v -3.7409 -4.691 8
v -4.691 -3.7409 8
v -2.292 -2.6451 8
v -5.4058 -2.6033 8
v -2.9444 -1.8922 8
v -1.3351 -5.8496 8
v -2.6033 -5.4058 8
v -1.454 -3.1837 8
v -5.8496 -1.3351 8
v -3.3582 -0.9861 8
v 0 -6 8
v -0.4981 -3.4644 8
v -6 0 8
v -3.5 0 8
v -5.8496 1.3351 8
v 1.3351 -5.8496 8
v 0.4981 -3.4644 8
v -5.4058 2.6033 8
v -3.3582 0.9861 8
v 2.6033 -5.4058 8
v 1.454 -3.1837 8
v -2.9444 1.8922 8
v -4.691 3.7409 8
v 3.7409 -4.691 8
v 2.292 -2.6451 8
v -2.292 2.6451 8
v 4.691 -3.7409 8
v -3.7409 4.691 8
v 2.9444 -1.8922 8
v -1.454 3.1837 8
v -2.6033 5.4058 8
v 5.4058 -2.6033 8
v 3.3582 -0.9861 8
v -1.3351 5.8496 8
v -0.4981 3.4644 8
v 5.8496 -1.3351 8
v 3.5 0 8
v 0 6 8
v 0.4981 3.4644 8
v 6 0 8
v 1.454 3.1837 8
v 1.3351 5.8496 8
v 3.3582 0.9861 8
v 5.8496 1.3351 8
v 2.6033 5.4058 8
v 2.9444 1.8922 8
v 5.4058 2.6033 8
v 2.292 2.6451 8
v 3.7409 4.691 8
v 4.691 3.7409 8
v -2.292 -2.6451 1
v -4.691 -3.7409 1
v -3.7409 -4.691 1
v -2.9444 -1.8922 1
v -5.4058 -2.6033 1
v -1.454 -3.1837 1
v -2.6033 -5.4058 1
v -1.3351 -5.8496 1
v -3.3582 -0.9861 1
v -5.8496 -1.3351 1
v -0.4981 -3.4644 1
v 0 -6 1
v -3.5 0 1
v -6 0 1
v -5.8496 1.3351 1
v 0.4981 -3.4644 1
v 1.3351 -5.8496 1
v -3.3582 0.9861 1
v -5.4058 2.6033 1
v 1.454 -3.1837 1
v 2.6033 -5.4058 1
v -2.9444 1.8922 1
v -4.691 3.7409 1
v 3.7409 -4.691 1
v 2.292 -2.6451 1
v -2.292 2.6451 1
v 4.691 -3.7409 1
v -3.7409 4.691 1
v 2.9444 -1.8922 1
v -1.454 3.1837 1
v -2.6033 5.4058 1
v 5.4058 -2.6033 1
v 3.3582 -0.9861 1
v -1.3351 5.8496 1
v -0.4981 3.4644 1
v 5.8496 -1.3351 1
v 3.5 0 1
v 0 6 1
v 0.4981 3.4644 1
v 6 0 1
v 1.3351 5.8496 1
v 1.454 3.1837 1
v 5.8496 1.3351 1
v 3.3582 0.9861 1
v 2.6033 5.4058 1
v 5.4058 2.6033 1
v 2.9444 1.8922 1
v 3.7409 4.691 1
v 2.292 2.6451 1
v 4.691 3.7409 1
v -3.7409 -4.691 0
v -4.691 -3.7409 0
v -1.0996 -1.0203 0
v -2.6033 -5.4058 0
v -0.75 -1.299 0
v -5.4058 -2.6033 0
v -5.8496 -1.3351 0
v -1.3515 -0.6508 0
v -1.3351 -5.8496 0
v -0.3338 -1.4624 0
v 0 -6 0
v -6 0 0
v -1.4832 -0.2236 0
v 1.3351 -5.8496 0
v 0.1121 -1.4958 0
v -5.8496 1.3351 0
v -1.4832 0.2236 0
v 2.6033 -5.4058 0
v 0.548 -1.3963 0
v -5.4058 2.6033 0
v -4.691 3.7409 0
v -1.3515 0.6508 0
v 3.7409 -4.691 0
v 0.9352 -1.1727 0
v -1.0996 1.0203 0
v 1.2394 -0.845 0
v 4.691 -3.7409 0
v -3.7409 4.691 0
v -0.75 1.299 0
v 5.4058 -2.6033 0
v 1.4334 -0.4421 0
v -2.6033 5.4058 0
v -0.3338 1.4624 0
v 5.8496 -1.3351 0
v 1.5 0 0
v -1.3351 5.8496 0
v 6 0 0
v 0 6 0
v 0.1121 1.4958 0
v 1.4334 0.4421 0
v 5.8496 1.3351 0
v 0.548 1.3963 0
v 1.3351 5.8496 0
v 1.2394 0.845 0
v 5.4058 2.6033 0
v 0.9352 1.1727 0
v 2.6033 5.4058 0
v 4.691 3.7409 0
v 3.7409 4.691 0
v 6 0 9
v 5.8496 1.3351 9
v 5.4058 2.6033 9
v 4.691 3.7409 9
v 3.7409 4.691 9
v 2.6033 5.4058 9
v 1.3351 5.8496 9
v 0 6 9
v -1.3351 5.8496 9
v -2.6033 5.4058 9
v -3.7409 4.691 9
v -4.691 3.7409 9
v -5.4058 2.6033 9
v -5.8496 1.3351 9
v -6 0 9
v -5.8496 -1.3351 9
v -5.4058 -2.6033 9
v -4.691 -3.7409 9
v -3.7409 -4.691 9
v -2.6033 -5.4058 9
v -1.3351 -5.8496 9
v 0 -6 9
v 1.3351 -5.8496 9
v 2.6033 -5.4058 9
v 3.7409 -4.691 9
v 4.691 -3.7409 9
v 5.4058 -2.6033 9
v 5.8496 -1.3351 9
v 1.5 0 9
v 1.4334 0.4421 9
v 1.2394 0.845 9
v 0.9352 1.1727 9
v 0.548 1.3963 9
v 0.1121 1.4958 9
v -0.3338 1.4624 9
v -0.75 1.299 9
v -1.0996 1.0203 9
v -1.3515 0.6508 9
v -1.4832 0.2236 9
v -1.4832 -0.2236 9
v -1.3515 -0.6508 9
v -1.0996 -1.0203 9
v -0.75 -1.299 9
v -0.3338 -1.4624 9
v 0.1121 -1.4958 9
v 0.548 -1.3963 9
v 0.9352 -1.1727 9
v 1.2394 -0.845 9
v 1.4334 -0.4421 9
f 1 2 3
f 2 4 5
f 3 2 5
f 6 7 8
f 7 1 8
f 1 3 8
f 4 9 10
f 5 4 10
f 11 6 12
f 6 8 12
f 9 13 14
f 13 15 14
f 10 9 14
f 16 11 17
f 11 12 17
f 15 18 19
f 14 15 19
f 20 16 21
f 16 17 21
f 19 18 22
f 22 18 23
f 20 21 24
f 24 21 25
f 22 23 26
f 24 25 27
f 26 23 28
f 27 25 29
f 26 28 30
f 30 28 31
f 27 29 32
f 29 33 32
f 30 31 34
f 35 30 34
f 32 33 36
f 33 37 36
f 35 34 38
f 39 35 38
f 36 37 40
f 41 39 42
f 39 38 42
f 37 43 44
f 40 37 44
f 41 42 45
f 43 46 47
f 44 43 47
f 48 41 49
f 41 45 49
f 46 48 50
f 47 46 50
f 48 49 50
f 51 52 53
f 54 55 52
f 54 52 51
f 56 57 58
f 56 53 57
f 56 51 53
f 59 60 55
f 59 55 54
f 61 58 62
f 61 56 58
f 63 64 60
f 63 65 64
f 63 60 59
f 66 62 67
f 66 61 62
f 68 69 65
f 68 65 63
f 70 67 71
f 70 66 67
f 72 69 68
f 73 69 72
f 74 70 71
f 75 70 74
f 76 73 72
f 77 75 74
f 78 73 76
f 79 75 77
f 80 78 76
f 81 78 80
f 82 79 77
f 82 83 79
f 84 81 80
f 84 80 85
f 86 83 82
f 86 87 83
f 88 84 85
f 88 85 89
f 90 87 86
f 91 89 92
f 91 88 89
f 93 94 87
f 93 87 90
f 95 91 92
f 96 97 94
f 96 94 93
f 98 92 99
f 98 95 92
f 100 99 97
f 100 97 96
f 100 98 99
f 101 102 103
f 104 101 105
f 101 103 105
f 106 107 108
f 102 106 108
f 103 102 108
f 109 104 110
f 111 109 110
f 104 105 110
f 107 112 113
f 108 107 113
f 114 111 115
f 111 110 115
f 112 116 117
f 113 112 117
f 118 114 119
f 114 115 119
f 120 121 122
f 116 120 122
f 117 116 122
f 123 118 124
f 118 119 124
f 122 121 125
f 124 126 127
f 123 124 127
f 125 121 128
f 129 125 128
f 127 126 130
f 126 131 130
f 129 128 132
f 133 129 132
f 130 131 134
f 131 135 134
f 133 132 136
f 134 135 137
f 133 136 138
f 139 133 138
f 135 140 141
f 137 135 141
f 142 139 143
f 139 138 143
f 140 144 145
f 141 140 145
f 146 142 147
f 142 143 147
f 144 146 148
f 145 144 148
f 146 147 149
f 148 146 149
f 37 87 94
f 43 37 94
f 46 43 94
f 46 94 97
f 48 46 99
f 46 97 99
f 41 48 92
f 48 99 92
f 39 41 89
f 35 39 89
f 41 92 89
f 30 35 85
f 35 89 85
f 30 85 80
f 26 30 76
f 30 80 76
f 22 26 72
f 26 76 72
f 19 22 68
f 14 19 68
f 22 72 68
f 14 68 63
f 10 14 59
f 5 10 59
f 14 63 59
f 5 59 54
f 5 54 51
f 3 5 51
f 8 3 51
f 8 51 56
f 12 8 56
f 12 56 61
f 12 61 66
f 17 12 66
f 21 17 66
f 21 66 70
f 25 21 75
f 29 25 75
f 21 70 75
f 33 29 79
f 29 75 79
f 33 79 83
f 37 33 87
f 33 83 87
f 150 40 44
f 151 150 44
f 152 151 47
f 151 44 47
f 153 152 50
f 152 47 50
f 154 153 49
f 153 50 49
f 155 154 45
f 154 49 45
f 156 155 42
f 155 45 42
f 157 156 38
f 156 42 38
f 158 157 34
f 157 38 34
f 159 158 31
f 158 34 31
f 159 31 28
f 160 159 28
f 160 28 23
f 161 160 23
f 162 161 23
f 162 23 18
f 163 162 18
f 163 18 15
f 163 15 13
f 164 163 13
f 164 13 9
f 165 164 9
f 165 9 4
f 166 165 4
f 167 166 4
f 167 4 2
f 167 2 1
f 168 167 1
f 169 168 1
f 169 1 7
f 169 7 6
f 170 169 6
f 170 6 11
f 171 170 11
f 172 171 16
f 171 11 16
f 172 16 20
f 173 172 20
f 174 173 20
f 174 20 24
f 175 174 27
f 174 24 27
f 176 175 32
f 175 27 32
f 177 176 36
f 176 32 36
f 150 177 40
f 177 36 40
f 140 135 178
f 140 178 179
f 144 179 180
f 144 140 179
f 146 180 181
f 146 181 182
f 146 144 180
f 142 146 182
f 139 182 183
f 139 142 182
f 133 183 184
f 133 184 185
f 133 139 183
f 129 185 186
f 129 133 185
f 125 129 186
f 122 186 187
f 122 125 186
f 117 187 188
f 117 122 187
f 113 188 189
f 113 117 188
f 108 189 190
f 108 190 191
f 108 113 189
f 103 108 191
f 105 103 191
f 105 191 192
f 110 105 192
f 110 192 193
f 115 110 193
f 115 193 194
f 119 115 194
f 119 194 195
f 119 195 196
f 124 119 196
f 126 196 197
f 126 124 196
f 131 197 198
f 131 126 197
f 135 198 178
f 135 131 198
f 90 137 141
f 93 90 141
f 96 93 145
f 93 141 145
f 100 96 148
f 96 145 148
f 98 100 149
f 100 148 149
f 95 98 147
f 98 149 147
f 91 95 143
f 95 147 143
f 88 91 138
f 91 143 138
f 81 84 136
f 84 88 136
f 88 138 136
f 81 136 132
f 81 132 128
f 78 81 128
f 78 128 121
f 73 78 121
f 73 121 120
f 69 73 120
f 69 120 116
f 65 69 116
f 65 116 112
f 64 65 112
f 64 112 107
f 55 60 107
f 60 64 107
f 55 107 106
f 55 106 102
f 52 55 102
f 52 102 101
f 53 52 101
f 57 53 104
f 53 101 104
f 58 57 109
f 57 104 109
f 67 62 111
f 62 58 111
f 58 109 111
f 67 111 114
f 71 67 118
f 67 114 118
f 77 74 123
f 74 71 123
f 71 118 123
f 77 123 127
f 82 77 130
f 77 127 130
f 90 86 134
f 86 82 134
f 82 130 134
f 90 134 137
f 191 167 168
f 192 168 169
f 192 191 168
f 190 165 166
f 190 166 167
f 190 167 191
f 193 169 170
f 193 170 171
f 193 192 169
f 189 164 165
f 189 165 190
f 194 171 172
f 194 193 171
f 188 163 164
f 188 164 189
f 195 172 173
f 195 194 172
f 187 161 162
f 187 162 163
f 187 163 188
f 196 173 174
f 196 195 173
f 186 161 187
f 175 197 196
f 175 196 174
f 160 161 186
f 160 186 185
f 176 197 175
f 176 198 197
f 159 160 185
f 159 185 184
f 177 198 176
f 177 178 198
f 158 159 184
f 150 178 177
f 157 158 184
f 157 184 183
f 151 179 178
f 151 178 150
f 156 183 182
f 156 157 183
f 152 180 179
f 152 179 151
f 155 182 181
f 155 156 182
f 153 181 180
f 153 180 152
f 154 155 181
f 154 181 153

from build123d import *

# Parameters (mm, degrees)
SKETCH2_R               = 6
SKETCH2_R_2             = 1.5
BOSS_EXTRUDE1_DEPTH     = 9
CUT_EXTRUDE_THIN1_START = 1
SKETCH2_3_R             = 13.5
SKETCH2_3_R_2           = 3.5
CUT_EXTRUDE_THIN1_DEPTH = 7


with BuildPart() as part:
    # Sketch2 → Boss-Extrude1 (new body)
    with BuildSketch(Plane.XY):
        Circle(SKETCH2_R)
        Circle(SKETCH2_R_2, mode=Mode.SUBTRACT)
    extrude(amount=BOSS_EXTRUDE1_DEPTH)

    # Sketch2<3> → Cut-Extrude-Thin1 (cut)
    with BuildSketch(Plane.XY.offset(CUT_EXTRUDE_THIN1_START)):
        Circle(SKETCH2_3_R)
        Circle(SKETCH2_3_R_2, mode=Mode.SUBTRACT)
    extrude(amount=CUT_EXTRUDE_THIN1_DEPTH, mode=Mode.SUBTRACT)


solid = part.part
